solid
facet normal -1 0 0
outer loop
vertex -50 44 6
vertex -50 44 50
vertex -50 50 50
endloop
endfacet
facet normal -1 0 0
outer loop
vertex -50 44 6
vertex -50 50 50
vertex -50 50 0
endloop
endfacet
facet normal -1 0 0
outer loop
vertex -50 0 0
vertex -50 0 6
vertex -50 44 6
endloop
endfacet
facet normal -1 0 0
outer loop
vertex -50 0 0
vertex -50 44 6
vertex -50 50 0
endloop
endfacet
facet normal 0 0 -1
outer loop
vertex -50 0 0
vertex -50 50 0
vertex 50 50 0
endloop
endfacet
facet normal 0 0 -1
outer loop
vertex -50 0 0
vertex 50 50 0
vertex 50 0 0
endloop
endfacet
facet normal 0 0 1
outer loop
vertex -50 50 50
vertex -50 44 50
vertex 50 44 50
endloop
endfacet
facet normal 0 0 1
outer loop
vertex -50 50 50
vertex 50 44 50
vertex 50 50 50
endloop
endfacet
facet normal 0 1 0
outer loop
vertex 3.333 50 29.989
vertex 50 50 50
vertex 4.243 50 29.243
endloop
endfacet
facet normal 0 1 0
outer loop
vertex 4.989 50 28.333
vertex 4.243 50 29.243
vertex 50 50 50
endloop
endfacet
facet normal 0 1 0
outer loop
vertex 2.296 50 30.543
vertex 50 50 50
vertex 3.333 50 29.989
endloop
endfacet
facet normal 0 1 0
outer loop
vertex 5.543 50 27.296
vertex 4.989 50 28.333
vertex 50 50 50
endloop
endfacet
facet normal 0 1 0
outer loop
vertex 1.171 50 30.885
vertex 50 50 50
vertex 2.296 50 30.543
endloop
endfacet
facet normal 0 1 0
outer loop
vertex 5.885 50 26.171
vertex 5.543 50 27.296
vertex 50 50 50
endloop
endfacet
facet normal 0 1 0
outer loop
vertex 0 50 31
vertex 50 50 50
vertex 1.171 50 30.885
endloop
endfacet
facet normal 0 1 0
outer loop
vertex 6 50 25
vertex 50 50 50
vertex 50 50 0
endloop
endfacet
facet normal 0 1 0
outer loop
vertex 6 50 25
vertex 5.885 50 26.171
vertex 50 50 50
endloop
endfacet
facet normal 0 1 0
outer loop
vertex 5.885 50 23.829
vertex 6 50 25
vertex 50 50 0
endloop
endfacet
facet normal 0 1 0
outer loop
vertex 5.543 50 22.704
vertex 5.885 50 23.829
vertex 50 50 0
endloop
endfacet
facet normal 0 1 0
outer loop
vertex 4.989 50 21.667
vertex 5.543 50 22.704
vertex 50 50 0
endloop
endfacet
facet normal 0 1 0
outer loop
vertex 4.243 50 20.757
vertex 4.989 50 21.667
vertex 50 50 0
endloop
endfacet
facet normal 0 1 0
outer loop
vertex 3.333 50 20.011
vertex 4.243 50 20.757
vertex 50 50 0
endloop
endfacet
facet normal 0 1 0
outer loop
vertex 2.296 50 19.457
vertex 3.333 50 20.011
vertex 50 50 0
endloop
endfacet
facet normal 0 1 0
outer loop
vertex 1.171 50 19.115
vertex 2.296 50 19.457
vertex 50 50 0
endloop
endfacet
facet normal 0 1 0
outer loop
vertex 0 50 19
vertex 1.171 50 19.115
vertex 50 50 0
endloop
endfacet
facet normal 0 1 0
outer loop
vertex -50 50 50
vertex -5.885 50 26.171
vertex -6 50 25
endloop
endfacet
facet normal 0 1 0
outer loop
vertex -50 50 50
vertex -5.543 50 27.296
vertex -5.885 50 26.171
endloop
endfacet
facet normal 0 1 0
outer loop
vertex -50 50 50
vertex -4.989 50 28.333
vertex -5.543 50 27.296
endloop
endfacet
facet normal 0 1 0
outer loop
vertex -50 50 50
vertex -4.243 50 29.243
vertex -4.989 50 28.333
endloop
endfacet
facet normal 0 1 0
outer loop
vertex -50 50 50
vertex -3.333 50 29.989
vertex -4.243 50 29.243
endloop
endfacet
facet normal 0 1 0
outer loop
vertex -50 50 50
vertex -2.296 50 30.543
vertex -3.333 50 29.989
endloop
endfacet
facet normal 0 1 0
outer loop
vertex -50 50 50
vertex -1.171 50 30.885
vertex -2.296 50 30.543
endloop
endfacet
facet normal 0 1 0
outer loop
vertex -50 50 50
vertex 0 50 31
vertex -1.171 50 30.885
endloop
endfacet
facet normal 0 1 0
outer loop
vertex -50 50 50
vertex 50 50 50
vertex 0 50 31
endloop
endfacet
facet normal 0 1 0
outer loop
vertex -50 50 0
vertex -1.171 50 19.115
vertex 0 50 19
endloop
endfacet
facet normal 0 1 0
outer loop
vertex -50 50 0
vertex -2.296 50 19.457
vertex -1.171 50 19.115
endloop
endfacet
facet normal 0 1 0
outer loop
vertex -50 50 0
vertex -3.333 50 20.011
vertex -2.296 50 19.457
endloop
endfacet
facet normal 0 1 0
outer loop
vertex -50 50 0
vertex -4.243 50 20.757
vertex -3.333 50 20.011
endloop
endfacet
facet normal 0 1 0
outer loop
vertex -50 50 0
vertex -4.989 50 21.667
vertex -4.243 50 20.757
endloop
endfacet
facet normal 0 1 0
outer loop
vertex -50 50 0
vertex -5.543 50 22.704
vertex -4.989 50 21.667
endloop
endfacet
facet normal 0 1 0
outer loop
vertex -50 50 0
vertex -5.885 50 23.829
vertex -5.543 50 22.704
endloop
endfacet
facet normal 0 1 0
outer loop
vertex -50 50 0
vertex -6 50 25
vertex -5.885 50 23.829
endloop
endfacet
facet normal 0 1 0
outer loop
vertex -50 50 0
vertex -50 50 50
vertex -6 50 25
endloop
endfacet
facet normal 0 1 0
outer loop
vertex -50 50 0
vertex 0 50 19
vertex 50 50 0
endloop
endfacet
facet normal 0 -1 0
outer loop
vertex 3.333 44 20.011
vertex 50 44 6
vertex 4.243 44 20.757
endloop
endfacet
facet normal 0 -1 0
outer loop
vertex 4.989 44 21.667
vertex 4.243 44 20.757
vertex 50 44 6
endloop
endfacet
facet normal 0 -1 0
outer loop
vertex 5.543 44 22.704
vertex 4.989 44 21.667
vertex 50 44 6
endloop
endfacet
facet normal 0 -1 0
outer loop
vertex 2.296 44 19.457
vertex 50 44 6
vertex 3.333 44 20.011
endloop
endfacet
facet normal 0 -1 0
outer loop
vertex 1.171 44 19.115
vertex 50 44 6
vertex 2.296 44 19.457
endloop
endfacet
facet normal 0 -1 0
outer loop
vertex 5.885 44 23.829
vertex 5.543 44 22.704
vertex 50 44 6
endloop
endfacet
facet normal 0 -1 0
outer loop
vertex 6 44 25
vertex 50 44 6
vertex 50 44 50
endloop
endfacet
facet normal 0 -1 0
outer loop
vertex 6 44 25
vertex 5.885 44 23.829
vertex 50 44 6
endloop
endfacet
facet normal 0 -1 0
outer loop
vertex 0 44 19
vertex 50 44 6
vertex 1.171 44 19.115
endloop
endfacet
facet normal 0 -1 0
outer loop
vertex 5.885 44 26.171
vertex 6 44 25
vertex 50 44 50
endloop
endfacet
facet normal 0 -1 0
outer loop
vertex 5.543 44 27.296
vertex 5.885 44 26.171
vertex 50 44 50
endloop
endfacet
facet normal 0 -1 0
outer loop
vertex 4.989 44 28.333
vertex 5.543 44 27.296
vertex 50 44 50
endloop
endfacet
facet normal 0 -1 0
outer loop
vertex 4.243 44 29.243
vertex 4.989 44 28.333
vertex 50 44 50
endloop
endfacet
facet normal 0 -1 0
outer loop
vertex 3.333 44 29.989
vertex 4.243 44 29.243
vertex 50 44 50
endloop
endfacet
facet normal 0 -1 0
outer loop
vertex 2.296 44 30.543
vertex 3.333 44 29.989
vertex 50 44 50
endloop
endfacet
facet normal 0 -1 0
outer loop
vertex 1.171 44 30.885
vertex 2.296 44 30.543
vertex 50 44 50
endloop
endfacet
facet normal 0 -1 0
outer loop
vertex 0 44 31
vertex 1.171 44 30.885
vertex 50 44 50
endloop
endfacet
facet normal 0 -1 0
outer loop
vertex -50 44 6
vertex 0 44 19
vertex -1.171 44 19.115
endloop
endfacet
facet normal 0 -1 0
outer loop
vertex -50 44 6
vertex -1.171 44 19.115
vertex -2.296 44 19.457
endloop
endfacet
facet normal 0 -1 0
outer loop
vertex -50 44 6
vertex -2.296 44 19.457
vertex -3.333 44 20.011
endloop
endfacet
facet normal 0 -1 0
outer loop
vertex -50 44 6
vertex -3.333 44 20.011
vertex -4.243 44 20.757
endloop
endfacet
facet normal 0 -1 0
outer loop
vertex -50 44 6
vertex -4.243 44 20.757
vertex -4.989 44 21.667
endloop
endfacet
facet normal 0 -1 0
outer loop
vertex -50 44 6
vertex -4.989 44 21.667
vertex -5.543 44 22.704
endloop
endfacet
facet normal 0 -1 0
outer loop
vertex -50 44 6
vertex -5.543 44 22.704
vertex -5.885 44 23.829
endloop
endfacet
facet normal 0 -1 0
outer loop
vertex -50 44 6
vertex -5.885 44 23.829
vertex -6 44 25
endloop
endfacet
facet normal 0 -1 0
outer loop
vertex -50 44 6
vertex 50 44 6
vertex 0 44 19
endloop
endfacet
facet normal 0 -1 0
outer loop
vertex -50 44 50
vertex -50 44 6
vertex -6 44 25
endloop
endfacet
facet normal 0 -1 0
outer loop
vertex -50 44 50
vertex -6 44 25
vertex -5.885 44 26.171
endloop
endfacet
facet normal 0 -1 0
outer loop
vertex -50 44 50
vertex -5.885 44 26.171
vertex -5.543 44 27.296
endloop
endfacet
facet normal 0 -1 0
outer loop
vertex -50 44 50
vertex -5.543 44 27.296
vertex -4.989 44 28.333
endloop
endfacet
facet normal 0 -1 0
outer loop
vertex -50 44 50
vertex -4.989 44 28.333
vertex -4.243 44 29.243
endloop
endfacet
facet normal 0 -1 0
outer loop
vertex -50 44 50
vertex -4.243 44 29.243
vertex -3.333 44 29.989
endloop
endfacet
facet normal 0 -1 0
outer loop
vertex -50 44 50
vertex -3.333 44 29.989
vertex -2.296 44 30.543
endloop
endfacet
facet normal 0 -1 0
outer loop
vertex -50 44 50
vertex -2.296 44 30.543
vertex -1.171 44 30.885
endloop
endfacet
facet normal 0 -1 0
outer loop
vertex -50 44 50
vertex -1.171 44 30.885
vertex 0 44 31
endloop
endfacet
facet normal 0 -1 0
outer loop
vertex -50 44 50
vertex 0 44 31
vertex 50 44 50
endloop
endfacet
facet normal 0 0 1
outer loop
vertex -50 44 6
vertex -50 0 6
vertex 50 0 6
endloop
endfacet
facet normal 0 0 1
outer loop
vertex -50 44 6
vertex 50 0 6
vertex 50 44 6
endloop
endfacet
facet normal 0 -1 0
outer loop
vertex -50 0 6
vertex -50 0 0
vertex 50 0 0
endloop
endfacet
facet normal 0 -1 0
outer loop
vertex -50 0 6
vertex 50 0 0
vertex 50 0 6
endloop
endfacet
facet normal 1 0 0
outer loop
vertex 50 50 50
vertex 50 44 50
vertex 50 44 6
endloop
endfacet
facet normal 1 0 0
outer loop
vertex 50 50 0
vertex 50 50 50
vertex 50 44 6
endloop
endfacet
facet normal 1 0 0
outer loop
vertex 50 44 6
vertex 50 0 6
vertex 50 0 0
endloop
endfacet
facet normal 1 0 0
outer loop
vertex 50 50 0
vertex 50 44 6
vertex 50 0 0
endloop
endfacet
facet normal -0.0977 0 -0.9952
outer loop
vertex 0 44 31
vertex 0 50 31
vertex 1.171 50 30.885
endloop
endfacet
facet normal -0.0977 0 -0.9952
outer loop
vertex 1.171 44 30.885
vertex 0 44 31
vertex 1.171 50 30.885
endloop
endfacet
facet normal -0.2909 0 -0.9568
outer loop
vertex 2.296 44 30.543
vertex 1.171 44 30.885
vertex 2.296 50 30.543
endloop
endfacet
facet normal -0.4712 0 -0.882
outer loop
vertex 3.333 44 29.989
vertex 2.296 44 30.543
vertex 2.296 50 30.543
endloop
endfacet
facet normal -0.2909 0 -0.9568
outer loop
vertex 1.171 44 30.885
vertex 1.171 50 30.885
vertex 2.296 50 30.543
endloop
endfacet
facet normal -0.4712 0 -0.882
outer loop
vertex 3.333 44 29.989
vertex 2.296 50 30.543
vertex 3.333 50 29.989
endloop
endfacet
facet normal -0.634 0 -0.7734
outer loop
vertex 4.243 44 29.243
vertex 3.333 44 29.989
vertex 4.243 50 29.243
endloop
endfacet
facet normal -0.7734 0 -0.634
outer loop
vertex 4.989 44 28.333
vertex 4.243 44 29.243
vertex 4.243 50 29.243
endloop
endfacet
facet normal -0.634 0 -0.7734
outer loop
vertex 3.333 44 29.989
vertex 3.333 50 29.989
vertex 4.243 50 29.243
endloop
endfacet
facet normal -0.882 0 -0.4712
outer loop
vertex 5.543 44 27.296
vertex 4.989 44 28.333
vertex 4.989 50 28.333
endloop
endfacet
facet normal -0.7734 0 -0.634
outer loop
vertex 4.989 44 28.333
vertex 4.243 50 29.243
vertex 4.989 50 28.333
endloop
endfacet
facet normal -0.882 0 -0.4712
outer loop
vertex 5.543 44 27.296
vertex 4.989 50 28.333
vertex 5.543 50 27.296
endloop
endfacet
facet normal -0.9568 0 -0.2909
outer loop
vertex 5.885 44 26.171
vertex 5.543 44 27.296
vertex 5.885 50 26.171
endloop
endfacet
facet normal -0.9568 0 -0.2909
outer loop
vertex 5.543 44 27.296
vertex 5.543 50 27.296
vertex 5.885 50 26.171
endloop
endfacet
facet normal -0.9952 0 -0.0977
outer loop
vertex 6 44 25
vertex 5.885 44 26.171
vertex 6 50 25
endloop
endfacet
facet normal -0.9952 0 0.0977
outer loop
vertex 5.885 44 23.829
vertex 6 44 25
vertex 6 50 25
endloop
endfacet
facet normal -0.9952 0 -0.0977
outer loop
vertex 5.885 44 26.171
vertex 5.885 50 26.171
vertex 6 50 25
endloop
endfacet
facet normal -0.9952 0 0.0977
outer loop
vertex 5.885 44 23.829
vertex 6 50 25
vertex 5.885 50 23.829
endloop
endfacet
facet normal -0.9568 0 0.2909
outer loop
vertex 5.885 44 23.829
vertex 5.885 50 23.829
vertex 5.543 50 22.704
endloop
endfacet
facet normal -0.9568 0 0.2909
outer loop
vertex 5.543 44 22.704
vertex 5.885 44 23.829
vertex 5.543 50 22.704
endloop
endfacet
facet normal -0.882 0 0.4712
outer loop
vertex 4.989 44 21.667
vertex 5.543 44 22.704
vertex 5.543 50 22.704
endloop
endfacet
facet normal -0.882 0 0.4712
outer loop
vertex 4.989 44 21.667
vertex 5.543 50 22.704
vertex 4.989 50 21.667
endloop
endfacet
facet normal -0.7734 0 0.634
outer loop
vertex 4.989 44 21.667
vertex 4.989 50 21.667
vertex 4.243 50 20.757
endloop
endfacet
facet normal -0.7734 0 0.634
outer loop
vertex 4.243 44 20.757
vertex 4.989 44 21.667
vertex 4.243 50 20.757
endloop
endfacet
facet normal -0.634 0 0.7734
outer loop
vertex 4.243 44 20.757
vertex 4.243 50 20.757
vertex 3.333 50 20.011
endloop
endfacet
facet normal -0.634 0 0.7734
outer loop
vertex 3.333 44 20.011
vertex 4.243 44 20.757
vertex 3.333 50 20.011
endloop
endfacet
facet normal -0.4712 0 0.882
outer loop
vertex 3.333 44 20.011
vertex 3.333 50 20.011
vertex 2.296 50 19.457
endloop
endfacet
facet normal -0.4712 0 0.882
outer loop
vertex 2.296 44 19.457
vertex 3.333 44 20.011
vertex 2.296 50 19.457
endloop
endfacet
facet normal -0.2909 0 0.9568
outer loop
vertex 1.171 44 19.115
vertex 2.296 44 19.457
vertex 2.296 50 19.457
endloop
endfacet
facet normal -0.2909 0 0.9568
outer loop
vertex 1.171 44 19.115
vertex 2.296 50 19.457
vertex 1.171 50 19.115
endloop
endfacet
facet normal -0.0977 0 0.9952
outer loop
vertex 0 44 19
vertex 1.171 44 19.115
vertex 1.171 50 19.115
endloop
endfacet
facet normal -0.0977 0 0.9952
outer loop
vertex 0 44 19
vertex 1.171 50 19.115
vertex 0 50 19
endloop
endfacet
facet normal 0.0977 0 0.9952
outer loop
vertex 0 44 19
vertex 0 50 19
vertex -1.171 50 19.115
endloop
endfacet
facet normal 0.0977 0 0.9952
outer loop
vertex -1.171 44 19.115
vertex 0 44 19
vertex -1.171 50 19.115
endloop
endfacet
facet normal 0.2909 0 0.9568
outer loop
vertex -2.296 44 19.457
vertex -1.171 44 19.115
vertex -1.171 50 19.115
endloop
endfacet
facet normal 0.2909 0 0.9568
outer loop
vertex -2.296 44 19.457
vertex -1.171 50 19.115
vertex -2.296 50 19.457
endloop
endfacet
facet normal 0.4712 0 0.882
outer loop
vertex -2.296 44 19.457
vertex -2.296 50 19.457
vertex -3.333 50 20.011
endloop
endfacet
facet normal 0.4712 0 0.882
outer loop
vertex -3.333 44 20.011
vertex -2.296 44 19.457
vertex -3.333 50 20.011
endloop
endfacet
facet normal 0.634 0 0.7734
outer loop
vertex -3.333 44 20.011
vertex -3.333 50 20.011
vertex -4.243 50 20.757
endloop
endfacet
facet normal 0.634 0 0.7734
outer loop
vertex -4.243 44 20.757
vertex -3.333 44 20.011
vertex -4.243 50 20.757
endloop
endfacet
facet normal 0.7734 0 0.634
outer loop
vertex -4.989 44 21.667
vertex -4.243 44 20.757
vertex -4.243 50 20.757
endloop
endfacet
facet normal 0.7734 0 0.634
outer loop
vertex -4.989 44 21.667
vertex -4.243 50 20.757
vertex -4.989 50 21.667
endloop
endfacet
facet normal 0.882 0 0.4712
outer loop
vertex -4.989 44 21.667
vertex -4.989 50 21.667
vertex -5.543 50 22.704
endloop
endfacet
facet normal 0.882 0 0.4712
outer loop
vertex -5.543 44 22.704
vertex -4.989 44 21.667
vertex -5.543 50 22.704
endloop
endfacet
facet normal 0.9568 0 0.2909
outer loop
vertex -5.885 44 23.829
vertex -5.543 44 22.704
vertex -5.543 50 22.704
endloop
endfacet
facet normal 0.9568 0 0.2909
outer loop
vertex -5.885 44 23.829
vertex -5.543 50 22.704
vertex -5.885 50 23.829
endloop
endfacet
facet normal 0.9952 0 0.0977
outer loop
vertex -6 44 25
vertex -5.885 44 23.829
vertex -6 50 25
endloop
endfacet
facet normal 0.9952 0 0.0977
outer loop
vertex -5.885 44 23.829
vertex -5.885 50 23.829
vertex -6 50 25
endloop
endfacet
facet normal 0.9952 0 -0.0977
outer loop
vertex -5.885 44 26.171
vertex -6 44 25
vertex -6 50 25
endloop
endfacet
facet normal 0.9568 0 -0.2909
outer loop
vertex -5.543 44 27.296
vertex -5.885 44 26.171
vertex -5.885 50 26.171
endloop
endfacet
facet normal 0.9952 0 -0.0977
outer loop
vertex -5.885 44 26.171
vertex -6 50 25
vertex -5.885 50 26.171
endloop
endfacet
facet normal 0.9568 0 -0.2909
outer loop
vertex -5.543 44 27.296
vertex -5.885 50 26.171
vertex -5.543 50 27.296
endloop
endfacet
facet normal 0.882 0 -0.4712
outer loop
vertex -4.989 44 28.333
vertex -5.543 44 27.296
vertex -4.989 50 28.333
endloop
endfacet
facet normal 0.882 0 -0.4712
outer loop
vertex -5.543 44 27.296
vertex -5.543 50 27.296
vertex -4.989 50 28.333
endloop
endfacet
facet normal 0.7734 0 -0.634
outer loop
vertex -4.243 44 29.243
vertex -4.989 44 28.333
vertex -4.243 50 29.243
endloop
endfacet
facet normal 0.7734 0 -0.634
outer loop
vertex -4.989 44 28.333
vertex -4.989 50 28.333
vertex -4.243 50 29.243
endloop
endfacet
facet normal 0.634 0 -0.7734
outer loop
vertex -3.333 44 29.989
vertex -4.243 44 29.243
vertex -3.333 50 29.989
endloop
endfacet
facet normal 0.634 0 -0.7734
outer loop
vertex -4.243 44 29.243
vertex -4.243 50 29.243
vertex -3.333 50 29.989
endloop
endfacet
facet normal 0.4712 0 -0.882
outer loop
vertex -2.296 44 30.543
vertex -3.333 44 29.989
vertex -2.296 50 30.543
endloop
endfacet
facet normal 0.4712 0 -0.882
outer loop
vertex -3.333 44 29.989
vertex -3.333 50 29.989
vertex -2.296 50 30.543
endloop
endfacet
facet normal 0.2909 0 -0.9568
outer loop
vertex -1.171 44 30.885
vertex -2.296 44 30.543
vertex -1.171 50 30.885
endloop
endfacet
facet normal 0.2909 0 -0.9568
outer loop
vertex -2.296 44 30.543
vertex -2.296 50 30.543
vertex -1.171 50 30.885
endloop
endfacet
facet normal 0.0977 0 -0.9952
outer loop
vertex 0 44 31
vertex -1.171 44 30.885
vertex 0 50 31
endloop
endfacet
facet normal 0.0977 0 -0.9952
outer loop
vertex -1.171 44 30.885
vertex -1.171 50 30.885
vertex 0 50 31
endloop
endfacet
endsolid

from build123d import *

# Parameters (mm, degrees)
PAD_DEPTH                  = 100
SKETCH001_R                = 6
POCKET_DEPTH               = 50.001
POCKETBODY_PITCH_ANGLE     = -90
POCKETBODY_PLACEMENT_ANGLE = -180


with BuildPart() as part:
    # Sketch → Pad (new body)
    with BuildSketch(Plane.XY):
        Polygon((0, 0), (0, 50), (6, 50), (6, 6), (50, 6), (50, 0), align=None)
    extrude(amount=PAD_DEPTH)

    # Sketch001 (on Face6 of Pad) → Pocket (cut, through all)
    with BuildSketch(Plane.XZ):
        with Locations((25, 50)):
            Circle(SKETCH001_R)
    extrude(amount=-POCKET_DEPTH, mode=Mode.SUBTRACT)


with BuildPart() as part_1:
    # PocketBody pitch: moved
    add(part.part.rotate(Axis((0, 0, 0), (0, 1, 0)), POCKETBODY_PITCH_ANGLE))


with BuildPart() as part_2:
    # PocketBody placement: moved
    add(part_1.part.moved(Location((-50, 50, 0))).rotate(Axis((-50, 50, 0), (0, 0, 1)), POCKETBODY_PLACEMENT_ANGLE))


solid = part_2.part
